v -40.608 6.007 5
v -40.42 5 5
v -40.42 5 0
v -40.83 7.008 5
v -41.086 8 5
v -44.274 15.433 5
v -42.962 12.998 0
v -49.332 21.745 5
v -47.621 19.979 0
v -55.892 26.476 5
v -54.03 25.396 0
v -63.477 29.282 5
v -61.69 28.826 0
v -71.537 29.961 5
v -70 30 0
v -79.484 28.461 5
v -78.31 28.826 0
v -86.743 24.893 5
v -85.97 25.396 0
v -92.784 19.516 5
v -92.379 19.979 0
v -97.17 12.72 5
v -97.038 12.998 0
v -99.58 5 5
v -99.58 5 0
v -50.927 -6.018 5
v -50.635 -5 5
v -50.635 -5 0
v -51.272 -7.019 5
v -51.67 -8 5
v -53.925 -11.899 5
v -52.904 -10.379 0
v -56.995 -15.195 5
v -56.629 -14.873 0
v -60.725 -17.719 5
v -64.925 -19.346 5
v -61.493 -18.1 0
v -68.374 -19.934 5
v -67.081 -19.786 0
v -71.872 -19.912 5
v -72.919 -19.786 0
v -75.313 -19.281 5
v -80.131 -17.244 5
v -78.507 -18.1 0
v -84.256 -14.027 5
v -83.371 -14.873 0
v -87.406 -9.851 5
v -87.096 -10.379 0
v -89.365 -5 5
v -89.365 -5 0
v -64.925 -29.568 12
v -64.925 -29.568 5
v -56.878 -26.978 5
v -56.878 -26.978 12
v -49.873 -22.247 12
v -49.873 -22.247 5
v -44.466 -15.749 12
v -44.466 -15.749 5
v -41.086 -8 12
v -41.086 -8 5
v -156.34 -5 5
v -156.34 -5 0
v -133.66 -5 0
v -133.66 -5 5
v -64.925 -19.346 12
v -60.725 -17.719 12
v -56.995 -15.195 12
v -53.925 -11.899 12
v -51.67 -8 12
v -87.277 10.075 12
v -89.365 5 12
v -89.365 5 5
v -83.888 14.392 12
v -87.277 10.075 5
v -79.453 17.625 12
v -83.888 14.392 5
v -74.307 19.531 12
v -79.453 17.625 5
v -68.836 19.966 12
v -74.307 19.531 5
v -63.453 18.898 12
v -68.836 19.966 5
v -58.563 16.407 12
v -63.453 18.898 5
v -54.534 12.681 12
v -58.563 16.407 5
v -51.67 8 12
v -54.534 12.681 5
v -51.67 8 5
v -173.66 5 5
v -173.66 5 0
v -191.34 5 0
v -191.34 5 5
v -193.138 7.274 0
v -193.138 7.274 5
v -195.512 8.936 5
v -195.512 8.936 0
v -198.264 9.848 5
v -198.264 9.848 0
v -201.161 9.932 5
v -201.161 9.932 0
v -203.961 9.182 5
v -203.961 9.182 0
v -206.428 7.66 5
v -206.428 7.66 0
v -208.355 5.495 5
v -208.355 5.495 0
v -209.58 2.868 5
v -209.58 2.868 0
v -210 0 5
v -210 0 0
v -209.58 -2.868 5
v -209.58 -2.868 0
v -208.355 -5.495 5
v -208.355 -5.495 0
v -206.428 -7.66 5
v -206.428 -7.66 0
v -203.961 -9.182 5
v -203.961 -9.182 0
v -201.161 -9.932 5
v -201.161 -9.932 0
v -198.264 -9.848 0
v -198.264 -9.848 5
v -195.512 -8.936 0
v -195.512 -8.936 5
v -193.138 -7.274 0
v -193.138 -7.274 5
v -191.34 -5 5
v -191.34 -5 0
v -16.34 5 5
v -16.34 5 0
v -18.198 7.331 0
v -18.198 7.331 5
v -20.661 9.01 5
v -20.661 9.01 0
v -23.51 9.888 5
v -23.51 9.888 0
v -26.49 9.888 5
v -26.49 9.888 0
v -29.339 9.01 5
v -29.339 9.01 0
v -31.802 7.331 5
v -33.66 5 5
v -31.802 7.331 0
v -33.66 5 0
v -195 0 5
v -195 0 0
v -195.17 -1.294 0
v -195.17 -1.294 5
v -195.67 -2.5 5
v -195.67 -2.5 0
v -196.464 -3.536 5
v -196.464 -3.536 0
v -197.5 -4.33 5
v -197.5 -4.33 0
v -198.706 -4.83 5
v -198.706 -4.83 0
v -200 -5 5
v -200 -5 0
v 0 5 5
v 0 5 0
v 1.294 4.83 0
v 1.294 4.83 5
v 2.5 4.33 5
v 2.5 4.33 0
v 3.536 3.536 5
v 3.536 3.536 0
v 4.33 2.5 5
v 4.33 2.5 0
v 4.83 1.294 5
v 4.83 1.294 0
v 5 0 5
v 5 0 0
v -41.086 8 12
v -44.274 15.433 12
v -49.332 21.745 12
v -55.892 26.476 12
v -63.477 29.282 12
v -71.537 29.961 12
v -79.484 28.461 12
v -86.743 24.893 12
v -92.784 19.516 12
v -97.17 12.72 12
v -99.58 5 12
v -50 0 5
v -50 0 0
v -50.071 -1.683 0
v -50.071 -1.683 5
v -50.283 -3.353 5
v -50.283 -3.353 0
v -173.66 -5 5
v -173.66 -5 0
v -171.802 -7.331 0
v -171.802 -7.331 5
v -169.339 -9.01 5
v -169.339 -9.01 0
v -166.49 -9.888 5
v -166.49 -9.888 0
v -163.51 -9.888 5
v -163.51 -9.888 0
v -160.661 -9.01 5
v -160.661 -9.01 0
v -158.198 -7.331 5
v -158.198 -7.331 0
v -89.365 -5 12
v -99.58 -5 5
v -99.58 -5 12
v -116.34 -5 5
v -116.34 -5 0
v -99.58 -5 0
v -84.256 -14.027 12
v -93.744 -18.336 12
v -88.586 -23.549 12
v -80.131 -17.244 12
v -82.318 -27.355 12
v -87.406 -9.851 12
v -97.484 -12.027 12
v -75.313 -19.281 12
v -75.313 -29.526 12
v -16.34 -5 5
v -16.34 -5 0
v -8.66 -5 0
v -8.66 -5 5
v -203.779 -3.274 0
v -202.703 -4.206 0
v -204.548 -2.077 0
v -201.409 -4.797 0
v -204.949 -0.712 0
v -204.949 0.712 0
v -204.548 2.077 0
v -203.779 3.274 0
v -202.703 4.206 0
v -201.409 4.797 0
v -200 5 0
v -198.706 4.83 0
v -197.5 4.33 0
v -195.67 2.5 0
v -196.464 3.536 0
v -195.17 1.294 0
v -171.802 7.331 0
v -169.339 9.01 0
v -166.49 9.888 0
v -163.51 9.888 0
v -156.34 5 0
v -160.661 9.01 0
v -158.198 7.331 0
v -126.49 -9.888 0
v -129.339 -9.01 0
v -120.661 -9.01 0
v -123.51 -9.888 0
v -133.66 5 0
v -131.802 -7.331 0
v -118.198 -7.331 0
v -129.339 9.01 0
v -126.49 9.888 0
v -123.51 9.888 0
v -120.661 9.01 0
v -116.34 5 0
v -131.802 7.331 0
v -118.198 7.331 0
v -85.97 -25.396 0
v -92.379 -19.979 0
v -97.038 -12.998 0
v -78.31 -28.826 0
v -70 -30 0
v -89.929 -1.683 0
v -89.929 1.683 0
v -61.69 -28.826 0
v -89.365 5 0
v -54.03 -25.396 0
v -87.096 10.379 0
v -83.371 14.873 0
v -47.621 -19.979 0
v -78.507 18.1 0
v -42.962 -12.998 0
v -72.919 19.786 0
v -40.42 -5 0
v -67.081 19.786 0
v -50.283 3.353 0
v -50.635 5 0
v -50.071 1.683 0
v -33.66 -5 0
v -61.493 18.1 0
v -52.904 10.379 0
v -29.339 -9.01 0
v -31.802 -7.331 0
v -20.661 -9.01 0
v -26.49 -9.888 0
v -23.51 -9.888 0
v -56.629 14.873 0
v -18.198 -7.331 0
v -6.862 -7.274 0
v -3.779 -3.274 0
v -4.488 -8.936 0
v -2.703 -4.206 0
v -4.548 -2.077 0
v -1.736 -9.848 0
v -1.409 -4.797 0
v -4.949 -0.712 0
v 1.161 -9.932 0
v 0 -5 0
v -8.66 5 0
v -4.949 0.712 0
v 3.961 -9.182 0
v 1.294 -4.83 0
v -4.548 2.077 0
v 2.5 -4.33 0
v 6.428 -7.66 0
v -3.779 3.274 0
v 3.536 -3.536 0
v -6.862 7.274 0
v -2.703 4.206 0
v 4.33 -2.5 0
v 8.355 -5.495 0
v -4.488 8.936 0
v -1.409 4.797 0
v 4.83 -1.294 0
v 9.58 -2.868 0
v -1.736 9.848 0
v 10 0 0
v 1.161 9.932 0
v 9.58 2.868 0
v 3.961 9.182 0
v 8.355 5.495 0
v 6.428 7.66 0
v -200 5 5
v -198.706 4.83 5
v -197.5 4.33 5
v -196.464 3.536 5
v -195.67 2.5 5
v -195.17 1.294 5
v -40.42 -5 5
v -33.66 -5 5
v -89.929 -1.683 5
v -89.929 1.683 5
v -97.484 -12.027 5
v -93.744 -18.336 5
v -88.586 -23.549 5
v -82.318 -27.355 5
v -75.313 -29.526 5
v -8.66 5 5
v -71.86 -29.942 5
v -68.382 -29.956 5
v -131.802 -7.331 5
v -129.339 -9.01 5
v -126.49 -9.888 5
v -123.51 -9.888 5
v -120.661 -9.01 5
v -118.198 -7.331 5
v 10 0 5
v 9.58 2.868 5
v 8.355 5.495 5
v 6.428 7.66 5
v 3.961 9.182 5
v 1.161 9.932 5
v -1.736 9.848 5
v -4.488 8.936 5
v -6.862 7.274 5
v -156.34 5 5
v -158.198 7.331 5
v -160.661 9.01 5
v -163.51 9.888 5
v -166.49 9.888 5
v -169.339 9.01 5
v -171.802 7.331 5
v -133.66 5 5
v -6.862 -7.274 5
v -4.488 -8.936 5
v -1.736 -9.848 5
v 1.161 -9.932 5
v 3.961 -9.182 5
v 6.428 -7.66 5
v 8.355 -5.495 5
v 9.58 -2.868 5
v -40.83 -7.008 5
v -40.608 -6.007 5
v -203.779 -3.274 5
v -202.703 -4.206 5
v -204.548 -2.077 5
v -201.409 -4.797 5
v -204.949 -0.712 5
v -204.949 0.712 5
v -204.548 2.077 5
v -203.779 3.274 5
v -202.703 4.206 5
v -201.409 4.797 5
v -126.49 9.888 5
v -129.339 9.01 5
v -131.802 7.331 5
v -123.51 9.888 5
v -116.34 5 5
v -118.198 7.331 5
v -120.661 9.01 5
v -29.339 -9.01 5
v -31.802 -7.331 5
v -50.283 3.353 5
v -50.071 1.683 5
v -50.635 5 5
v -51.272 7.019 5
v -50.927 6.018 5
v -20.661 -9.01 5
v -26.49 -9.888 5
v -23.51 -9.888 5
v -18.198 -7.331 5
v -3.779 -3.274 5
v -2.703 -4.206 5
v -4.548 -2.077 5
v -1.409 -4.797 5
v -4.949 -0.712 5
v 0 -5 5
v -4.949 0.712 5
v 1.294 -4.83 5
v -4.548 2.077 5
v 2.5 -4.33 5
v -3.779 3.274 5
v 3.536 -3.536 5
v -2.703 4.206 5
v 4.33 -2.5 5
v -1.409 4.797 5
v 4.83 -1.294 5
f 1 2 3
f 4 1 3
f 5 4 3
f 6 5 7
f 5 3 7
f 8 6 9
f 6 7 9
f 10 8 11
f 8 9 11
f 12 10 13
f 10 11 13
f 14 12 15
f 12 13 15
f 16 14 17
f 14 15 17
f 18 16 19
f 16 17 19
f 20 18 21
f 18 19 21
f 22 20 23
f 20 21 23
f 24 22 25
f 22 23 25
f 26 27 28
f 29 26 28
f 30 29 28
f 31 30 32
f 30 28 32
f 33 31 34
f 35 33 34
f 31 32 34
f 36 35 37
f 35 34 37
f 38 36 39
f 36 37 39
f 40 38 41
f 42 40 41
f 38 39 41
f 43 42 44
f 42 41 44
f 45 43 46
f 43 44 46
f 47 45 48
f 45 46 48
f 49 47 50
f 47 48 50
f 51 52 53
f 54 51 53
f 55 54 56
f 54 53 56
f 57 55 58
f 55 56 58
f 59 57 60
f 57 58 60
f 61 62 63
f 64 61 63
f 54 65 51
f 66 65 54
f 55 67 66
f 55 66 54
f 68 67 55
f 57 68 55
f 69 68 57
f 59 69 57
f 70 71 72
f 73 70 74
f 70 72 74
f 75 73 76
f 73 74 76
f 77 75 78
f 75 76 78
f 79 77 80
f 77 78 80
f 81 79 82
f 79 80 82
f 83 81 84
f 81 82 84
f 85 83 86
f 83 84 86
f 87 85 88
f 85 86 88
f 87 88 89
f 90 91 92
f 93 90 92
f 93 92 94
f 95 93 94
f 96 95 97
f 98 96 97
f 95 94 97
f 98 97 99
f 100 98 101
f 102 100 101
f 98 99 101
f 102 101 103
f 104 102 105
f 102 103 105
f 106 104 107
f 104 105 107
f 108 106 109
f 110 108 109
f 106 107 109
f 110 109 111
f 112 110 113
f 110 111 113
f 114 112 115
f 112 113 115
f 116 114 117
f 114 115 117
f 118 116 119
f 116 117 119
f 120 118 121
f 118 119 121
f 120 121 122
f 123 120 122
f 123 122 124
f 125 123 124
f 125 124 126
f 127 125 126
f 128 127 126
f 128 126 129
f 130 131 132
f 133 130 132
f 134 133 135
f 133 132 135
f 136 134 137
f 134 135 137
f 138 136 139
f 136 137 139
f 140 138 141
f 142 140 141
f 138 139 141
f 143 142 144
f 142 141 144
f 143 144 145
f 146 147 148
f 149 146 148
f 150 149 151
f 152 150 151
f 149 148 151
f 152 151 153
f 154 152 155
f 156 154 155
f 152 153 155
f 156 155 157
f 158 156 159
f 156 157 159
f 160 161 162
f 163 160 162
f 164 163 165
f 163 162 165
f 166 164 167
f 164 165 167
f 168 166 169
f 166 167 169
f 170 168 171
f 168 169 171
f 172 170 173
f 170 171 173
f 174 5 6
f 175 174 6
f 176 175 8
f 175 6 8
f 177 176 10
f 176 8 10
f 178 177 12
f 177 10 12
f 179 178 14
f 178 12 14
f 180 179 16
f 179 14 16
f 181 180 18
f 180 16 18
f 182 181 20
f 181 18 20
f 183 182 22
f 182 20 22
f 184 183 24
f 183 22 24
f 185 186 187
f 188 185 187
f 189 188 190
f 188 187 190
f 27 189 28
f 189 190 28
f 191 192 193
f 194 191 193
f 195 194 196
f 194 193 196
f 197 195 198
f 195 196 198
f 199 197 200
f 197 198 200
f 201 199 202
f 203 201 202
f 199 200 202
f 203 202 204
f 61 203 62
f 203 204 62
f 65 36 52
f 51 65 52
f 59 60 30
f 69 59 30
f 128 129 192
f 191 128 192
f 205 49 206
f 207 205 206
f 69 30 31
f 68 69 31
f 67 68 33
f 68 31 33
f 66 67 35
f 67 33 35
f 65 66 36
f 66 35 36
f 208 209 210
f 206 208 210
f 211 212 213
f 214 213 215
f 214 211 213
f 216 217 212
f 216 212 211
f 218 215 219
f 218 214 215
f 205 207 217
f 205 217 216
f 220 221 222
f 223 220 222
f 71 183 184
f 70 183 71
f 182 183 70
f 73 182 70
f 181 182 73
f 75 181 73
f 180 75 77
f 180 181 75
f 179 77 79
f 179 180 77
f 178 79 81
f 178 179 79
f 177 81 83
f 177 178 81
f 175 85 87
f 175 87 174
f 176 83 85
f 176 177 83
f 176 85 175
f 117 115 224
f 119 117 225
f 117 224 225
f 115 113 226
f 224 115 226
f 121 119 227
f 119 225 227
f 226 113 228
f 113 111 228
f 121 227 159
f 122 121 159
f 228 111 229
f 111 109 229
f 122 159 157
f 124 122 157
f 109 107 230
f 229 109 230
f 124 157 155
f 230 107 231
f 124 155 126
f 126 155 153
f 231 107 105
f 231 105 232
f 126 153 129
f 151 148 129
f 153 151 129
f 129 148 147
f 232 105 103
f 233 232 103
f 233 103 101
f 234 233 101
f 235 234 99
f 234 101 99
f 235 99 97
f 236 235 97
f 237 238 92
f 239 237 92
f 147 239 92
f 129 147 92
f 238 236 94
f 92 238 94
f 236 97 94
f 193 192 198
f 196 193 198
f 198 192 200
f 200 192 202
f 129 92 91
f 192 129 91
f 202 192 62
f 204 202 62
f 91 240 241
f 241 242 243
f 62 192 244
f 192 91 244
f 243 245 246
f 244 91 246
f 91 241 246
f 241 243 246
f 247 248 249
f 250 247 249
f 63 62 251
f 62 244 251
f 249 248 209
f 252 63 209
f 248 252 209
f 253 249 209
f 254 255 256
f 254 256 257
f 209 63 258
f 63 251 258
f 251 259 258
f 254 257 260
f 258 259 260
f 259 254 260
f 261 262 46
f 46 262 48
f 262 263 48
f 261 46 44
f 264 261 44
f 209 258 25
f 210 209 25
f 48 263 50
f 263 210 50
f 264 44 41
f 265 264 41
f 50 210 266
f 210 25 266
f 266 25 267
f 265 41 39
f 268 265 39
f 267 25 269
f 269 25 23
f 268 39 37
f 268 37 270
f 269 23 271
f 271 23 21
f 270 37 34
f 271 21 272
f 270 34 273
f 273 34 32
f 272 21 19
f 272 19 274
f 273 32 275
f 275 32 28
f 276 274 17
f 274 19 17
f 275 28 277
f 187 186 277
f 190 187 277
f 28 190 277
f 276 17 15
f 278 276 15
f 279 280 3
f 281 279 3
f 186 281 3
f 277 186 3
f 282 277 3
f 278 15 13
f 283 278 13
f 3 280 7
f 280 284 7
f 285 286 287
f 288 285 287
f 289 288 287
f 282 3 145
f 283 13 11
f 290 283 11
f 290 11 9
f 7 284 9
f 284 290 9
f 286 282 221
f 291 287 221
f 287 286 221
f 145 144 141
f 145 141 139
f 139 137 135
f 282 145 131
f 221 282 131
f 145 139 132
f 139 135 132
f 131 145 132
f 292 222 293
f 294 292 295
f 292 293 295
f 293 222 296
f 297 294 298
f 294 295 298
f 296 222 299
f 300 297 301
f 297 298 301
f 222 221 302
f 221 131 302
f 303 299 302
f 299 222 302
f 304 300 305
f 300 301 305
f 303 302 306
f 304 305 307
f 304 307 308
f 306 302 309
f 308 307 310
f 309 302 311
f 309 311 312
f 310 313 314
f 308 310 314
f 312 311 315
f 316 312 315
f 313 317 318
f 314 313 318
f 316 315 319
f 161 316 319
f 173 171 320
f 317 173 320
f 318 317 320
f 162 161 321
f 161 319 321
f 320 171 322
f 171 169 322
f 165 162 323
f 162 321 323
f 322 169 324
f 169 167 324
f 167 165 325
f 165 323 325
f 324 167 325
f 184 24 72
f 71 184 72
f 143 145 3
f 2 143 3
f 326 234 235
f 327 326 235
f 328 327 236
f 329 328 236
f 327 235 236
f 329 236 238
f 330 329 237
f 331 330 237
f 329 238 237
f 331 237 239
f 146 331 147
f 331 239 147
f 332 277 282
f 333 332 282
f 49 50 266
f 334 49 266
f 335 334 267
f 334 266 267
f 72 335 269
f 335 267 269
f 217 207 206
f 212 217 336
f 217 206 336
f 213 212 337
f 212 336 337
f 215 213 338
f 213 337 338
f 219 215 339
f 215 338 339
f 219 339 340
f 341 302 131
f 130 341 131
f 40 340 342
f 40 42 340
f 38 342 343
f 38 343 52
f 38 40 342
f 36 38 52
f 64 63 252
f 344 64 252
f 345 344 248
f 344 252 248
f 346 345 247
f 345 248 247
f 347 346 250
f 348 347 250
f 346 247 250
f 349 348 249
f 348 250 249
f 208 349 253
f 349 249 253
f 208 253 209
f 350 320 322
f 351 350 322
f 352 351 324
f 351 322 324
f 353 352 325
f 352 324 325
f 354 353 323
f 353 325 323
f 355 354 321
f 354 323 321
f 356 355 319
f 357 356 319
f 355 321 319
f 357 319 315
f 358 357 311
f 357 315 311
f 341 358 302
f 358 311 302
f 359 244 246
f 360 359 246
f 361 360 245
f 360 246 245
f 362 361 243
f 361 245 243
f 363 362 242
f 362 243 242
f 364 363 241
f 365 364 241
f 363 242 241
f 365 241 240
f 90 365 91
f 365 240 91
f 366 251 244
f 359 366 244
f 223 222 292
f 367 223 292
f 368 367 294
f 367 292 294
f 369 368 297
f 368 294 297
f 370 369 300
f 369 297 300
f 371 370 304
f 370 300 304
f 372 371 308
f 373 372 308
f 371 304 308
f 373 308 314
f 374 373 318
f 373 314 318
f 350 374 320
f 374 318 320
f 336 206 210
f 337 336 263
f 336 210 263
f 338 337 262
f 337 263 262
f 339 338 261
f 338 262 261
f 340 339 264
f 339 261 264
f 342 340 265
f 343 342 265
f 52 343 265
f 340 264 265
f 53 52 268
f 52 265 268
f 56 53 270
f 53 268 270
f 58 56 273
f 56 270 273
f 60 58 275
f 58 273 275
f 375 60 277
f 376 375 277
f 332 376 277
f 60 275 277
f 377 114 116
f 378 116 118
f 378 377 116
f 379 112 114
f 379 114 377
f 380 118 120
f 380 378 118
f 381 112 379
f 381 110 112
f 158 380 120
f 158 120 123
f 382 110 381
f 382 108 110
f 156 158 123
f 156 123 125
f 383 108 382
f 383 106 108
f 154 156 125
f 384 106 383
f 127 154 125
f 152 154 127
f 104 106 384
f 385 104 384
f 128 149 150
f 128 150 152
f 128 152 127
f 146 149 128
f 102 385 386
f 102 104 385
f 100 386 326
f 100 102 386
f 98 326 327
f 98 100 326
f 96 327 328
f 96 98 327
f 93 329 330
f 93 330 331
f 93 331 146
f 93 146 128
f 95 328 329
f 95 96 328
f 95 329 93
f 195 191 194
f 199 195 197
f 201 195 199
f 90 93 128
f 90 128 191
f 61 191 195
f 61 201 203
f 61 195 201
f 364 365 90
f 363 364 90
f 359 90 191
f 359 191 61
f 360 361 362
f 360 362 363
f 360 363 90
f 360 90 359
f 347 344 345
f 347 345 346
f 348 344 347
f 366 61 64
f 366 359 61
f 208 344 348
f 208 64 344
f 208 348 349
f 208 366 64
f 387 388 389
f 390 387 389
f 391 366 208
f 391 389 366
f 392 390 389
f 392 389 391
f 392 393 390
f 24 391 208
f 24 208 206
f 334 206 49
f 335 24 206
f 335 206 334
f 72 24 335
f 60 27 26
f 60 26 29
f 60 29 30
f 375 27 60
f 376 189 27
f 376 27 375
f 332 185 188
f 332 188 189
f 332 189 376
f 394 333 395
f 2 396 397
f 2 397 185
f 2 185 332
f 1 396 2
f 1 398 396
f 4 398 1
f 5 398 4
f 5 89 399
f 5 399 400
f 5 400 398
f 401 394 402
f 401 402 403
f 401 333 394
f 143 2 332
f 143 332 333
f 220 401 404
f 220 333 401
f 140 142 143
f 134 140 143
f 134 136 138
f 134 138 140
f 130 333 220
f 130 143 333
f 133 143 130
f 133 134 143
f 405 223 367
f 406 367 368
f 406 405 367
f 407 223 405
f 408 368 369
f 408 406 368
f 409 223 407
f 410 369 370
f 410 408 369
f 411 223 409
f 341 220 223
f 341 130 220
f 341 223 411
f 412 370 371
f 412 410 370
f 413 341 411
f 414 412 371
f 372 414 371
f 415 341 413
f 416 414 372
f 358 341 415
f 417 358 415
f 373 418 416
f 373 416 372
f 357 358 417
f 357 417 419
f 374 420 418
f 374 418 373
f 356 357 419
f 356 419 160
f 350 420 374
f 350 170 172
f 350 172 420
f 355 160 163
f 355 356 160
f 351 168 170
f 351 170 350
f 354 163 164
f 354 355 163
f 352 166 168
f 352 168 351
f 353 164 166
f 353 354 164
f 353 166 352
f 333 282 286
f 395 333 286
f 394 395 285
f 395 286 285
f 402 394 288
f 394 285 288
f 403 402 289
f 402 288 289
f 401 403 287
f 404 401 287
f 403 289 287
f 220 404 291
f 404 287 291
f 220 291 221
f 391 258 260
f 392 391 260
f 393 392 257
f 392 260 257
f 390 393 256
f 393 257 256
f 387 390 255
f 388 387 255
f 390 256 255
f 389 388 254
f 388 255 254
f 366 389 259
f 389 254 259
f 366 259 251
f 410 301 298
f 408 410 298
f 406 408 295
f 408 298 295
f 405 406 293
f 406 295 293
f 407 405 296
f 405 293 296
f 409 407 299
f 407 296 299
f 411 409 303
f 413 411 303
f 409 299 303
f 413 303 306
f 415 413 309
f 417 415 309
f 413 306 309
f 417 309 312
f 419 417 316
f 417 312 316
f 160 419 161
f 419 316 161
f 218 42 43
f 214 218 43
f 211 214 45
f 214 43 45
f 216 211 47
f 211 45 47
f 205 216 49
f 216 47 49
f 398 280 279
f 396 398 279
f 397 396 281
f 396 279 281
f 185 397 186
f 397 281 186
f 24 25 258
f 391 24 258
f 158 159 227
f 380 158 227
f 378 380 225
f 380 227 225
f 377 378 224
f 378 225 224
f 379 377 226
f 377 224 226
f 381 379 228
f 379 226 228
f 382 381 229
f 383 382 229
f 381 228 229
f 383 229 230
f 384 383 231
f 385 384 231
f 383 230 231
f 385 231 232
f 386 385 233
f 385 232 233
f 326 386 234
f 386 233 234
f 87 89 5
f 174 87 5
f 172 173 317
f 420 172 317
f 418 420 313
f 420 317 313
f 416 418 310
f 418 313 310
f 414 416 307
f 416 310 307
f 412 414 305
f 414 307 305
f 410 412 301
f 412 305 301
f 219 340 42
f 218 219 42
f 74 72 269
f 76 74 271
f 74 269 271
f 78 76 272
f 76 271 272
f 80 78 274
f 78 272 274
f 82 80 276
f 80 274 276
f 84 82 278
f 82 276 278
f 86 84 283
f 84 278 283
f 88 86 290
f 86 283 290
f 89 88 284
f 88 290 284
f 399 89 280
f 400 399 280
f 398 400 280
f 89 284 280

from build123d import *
from build123d import SkipClean  # not in build123d's __all__

# Parameters (mm, degrees)
F1_DEPTH = 5
F3_DEPTH = 7


with BuildPart() as f1:
    # F0 (on Top) → F1 (new body)
    with BuildSketch(Plane.XY):
        with BuildLine():
            ThreePointArc((0, 5), (3.5355339059, 3.5355339059), (5, 0))
            ThreePointArc((5, 0), (3.5355339059, -3.5355339059), (0, -5))
            Line((0, -5), (-8.6602540378, -5))
            ThreePointArc((-8.6602540378, -5), (2.588190451, -9.6592582629), (10, 0))
            ThreePointArc((10, 0), (2.588190451, 9.6592582629), (-8.6602540378, 5))
            Line((-8.6602540378, 5), (0, 5))
        make_face()
        with BuildLine():
            ThreePointArc((0, -5), (-5, 0), (0, 5))
            Line((0, 5), (-8.6602540378, 5))
            ThreePointArc((-8.6602540378, 5), (-10, 0), (-8.6602540378, -5))
            Line((-8.6602540378, -5), (0, -5))
        make_face()
        with BuildLine():
            ThreePointArc((-8.6602540378, -5), (-10, 0), (-8.6602540378, 5))
            Line((-8.6602540378, 5), (-16.3397459622, 5))
            ThreePointArc((-16.3397459622, 5), (-15.3407417371, 2.588190451), (-15, 0))
            ThreePointArc((-15, 0), (-15.3407417371, -2.588190451), (-16.3397459622, -5))
            Line((-16.3397459622, -5), (-8.6602540378, -5))
        make_face()
        with BuildLine():
            ThreePointArc((-15, 0), (-15.3407417371, 2.588190451), (-16.3397459622, 5))
            Line((-16.3397459622, 5), (-33.6602540378, 5))
            ThreePointArc((-33.6602540378, 5), (-35, 0), (-33.6602540378, -5))
            Line((-33.6602540378, -5), (-16.3397459622, -5))
            ThreePointArc((-16.3397459622, -5), (-15.3407417371, -2.588190451), (-15, 0))
        make_face()
        with BuildLine():
            Line((-33.6602540378, 5), (-16.3397459622, 5))
            ThreePointArc((-16.3397459622, 5), (-25, 10), (-33.6602540378, 5))
        make_face()
        with BuildLine():
            ThreePointArc((-33.6602540378, -5), (-25, -10), (-16.3397459622, -5))
            Line((-16.3397459622, -5), (-33.6602540378, -5))
        make_face()
        with BuildLine():
            ThreePointArc((-33.6602540378, -5), (-35, 0), (-33.6602540378, 5))
            Line((-33.6602540378, 5), (-40.4196010845, 5))
            ThreePointArc((-40.4196010845, 5), (-40.1050843164, 2.5087878084), (-40, 0))
            ThreePointArc((-40, 0), (-40.1050843164, -2.5087878084), (-40.4196010845, -5))
            Line((-40.4196010845, -5), (-33.6602540378, -5))
        make_face()
        with BuildLine():
            ThreePointArc((-40, 0), (-40.1050843164, 2.5087878084), (-40.4196010845, 5))
            Line((-40.4196010845, 5), (-50.635083269, 5))
            ThreePointArc((-50.635083269, 5), (-50.1594060747, 2.5200858497), (-50, 0))
            ThreePointArc((-50, 0), (-50.1594060747, -2.5200858497), (-50.635083269, -5))
            Line((-50.635083269, -5), (-40.4196010845, -5))
            ThreePointArc((-40.4196010845, -5), (-40.1050843164, -2.5087878084), (-40, 0))
        make_face()
        with BuildLine():
            Line((-50.635083269, 5), (-40.4196010845, 5))
            ThreePointArc((-40.4196010845, 5), (-70, 30), (-99.5803989155, 5))
            Line((-99.5803989155, 5), (-89.364916731, 5))
            ThreePointArc((-89.364916731, 5), (-70, 20), (-50.635083269, 5))
        make_face()
        with BuildLine():
            ThreePointArc((-99.5803989155, -5), (-70, -30), (-40.4196010845, -5))
            Line((-40.4196010845, -5), (-50.635083269, -5))
            ThreePointArc((-50.635083269, -5), (-70, -20), (-89.364916731, -5))
            Line((-89.364916731, -5), (-99.5803989155, -5))
        make_face()
        with BuildLine():
            ThreePointArc((-99.5803989155, -5), (-100, 0), (-99.5803989155, 5))
            Line((-99.5803989155, 5), (-116.3397459622, 5))
            ThreePointArc((-116.3397459622, 5), (-115.3407417371, 2.588190451), (-115, 0))
            ThreePointArc((-115, 0), (-115.3407417371, -2.588190451), (-116.3397459622, -5))
            Line((-116.3397459622, -5), (-99.5803989155, -5))
        make_face()
        with BuildLine():
            Line((-89.364916731, 5), (-99.5803989155, 5))
            ThreePointArc((-99.5803989155, 5), (-100, 0), (-99.5803989155, -5))
            Line((-99.5803989155, -5), (-89.364916731, -5))
            ThreePointArc((-89.364916731, -5), (-90, 0), (-89.364916731, 5))
        make_face()
        with BuildLine():
            ThreePointArc((-115, 0), (-115.3407417371, 2.588190451), (-116.3397459622, 5))
            Line((-116.3397459622, 5), (-133.6602540378, 5))
            ThreePointArc((-133.6602540378, 5), (-135, 0), (-133.6602540378, -5))
            Line((-133.6602540378, -5), (-116.3397459622, -5))
            ThreePointArc((-116.3397459622, -5), (-115.3407417371, -2.588190451), (-115, 0))
        make_face()
        with BuildLine():
            Line((-133.6602540378, 5), (-116.3397459622, 5))
            ThreePointArc((-116.3397459622, 5), (-125, 10), (-133.6602540378, 5))
        make_face()
        with BuildLine():
            ThreePointArc((-133.6602540378, -5), (-125, -10), (-116.3397459622, -5))
            Line((-116.3397459622, -5), (-133.6602540378, -5))
        make_face()
        with BuildLine():
            ThreePointArc((-133.6602540378, -5), (-135, 0), (-133.6602540378, 5))
            Line((-133.6602540378, 5), (-156.3397459622, 5))
            ThreePointArc((-156.3397459622, 5), (-155.3407417371, 2.588190451), (-155, 0))
            ThreePointArc((-155, 0), (-155.3407417371, -2.588190451), (-156.3397459622, -5))
            Line((-156.3397459622, -5), (-133.6602540378, -5))
        make_face()
        with BuildLine():
            ThreePointArc((-155, 0), (-155.3407417371, 2.588190451), (-156.3397459622, 5))
            Line((-156.3397459622, 5), (-173.6602540378, 5))
            ThreePointArc((-173.6602540378, 5), (-175, 0), (-173.6602540378, -5))
            Line((-173.6602540378, -5), (-156.3397459622, -5))
            ThreePointArc((-156.3397459622, -5), (-155.3407417371, -2.588190451), (-155, 0))
        make_face()
        with BuildLine():
            Line((-173.6602540378, 5), (-156.3397459622, 5))
            ThreePointArc((-156.3397459622, 5), (-165, 10), (-173.6602540378, 5))
        make_face()
        with BuildLine():
            ThreePointArc((-173.6602540378, -5), (-165, -10), (-156.3397459622, -5))
            Line((-156.3397459622, -5), (-173.6602540378, -5))
        make_face()
        with BuildLine():
            ThreePointArc((-173.6602540378, -5), (-175, 0), (-173.6602540378, 5))
            Line((-173.6602540378, 5), (-191.3397459622, 5))
            ThreePointArc((-191.3397459622, 5), (-190.3407417371, 2.588190451), (-190, 0))
            ThreePointArc((-190, 0), (-190.3407417371, -2.588190451), (-191.3397459622, -5))
            Line((-191.3397459622, -5), (-173.6602540378, -5))
        make_face()
        with BuildLine():
            ThreePointArc((-190, 0), (-190.3407417371, 2.588190451), (-191.3397459622, 5))
            Line((-191.3397459622, 5), (-200, 5))
            ThreePointArc((-200, 5), (-196.4644660941, 3.5355339059), (-195, 0))
            ThreePointArc((-195, 0), (-196.4644660941, -3.5355339059), (-200, -5))
            Line((-200, -5), (-191.3397459622, -5))
            ThreePointArc((-191.3397459622, -5), (-190.3407417371, -2.588190451), (-190, 0))
        make_face()
        with BuildLine():
            Line((-200, 5), (-191.3397459622, 5))
            ThreePointArc((-191.3397459622, 5), (-210, 0), (-191.3397459622, -5))
            Line((-191.3397459622, -5), (-200, -5))
            ThreePointArc((-200, -5), (-205, 0), (-200, 5))
        make_face()
    extrude(amount=F1_DEPTH)

    # F2 (on face) → F3 (join)
    with BuildSketch(Plane.XY.offset(5)):
        with BuildLine():
            ThreePointArc((-75.3128379583, -19.2814354452), (-84.2561475764, -14.0271970215), (-89.364916731, -5))
            Line((-89.364916731, -5), (-99.5803989155, -5))
            ThreePointArc((-99.5803989155, -5), (-91.3251821922, -21.1006304282), (-75.3128379583, -29.5258150239))
            Line((-75.3128379583, -29.5258150239), (-75.3128379583, -19.2814354452))
        make_face()
        with BuildLine():
            ThreePointArc((-41.0863354104, 8), (-71.5365980819, 29.9606219284), (-99.5803989155, 5))
            Line((-99.5803989155, 5), (-89.364916731, 5))
            ThreePointArc((-89.364916731, 5), (-71.5866967281, 19.9369604878), (-51.6696972202, 8))
            Line((-51.6696972202, 8), (-41.0863354104, 8))
        make_face()
        with BuildLine():
            ThreePointArc((-64.9254471064, -29.5677005012), (-49.8731234875, -22.2465467399), (-41.0863354104, -8))
            Line((-41.0863354104, -8), (-51.6696972202, -8))
            ThreePointArc((-51.6696972202, -8), (-56.9951167094, -15.1945059346), (-64.9254471064, -19.345514026))
            Line((-64.9254471064, -19.345514026), (-64.9254471064, -29.5677005012))
        make_face()
    with SkipClean():  # cleaning this boolean's faces spoils the solid; the shape is the same uncleaned
        extrude(amount=F3_DEPTH)


solid = f1.part
